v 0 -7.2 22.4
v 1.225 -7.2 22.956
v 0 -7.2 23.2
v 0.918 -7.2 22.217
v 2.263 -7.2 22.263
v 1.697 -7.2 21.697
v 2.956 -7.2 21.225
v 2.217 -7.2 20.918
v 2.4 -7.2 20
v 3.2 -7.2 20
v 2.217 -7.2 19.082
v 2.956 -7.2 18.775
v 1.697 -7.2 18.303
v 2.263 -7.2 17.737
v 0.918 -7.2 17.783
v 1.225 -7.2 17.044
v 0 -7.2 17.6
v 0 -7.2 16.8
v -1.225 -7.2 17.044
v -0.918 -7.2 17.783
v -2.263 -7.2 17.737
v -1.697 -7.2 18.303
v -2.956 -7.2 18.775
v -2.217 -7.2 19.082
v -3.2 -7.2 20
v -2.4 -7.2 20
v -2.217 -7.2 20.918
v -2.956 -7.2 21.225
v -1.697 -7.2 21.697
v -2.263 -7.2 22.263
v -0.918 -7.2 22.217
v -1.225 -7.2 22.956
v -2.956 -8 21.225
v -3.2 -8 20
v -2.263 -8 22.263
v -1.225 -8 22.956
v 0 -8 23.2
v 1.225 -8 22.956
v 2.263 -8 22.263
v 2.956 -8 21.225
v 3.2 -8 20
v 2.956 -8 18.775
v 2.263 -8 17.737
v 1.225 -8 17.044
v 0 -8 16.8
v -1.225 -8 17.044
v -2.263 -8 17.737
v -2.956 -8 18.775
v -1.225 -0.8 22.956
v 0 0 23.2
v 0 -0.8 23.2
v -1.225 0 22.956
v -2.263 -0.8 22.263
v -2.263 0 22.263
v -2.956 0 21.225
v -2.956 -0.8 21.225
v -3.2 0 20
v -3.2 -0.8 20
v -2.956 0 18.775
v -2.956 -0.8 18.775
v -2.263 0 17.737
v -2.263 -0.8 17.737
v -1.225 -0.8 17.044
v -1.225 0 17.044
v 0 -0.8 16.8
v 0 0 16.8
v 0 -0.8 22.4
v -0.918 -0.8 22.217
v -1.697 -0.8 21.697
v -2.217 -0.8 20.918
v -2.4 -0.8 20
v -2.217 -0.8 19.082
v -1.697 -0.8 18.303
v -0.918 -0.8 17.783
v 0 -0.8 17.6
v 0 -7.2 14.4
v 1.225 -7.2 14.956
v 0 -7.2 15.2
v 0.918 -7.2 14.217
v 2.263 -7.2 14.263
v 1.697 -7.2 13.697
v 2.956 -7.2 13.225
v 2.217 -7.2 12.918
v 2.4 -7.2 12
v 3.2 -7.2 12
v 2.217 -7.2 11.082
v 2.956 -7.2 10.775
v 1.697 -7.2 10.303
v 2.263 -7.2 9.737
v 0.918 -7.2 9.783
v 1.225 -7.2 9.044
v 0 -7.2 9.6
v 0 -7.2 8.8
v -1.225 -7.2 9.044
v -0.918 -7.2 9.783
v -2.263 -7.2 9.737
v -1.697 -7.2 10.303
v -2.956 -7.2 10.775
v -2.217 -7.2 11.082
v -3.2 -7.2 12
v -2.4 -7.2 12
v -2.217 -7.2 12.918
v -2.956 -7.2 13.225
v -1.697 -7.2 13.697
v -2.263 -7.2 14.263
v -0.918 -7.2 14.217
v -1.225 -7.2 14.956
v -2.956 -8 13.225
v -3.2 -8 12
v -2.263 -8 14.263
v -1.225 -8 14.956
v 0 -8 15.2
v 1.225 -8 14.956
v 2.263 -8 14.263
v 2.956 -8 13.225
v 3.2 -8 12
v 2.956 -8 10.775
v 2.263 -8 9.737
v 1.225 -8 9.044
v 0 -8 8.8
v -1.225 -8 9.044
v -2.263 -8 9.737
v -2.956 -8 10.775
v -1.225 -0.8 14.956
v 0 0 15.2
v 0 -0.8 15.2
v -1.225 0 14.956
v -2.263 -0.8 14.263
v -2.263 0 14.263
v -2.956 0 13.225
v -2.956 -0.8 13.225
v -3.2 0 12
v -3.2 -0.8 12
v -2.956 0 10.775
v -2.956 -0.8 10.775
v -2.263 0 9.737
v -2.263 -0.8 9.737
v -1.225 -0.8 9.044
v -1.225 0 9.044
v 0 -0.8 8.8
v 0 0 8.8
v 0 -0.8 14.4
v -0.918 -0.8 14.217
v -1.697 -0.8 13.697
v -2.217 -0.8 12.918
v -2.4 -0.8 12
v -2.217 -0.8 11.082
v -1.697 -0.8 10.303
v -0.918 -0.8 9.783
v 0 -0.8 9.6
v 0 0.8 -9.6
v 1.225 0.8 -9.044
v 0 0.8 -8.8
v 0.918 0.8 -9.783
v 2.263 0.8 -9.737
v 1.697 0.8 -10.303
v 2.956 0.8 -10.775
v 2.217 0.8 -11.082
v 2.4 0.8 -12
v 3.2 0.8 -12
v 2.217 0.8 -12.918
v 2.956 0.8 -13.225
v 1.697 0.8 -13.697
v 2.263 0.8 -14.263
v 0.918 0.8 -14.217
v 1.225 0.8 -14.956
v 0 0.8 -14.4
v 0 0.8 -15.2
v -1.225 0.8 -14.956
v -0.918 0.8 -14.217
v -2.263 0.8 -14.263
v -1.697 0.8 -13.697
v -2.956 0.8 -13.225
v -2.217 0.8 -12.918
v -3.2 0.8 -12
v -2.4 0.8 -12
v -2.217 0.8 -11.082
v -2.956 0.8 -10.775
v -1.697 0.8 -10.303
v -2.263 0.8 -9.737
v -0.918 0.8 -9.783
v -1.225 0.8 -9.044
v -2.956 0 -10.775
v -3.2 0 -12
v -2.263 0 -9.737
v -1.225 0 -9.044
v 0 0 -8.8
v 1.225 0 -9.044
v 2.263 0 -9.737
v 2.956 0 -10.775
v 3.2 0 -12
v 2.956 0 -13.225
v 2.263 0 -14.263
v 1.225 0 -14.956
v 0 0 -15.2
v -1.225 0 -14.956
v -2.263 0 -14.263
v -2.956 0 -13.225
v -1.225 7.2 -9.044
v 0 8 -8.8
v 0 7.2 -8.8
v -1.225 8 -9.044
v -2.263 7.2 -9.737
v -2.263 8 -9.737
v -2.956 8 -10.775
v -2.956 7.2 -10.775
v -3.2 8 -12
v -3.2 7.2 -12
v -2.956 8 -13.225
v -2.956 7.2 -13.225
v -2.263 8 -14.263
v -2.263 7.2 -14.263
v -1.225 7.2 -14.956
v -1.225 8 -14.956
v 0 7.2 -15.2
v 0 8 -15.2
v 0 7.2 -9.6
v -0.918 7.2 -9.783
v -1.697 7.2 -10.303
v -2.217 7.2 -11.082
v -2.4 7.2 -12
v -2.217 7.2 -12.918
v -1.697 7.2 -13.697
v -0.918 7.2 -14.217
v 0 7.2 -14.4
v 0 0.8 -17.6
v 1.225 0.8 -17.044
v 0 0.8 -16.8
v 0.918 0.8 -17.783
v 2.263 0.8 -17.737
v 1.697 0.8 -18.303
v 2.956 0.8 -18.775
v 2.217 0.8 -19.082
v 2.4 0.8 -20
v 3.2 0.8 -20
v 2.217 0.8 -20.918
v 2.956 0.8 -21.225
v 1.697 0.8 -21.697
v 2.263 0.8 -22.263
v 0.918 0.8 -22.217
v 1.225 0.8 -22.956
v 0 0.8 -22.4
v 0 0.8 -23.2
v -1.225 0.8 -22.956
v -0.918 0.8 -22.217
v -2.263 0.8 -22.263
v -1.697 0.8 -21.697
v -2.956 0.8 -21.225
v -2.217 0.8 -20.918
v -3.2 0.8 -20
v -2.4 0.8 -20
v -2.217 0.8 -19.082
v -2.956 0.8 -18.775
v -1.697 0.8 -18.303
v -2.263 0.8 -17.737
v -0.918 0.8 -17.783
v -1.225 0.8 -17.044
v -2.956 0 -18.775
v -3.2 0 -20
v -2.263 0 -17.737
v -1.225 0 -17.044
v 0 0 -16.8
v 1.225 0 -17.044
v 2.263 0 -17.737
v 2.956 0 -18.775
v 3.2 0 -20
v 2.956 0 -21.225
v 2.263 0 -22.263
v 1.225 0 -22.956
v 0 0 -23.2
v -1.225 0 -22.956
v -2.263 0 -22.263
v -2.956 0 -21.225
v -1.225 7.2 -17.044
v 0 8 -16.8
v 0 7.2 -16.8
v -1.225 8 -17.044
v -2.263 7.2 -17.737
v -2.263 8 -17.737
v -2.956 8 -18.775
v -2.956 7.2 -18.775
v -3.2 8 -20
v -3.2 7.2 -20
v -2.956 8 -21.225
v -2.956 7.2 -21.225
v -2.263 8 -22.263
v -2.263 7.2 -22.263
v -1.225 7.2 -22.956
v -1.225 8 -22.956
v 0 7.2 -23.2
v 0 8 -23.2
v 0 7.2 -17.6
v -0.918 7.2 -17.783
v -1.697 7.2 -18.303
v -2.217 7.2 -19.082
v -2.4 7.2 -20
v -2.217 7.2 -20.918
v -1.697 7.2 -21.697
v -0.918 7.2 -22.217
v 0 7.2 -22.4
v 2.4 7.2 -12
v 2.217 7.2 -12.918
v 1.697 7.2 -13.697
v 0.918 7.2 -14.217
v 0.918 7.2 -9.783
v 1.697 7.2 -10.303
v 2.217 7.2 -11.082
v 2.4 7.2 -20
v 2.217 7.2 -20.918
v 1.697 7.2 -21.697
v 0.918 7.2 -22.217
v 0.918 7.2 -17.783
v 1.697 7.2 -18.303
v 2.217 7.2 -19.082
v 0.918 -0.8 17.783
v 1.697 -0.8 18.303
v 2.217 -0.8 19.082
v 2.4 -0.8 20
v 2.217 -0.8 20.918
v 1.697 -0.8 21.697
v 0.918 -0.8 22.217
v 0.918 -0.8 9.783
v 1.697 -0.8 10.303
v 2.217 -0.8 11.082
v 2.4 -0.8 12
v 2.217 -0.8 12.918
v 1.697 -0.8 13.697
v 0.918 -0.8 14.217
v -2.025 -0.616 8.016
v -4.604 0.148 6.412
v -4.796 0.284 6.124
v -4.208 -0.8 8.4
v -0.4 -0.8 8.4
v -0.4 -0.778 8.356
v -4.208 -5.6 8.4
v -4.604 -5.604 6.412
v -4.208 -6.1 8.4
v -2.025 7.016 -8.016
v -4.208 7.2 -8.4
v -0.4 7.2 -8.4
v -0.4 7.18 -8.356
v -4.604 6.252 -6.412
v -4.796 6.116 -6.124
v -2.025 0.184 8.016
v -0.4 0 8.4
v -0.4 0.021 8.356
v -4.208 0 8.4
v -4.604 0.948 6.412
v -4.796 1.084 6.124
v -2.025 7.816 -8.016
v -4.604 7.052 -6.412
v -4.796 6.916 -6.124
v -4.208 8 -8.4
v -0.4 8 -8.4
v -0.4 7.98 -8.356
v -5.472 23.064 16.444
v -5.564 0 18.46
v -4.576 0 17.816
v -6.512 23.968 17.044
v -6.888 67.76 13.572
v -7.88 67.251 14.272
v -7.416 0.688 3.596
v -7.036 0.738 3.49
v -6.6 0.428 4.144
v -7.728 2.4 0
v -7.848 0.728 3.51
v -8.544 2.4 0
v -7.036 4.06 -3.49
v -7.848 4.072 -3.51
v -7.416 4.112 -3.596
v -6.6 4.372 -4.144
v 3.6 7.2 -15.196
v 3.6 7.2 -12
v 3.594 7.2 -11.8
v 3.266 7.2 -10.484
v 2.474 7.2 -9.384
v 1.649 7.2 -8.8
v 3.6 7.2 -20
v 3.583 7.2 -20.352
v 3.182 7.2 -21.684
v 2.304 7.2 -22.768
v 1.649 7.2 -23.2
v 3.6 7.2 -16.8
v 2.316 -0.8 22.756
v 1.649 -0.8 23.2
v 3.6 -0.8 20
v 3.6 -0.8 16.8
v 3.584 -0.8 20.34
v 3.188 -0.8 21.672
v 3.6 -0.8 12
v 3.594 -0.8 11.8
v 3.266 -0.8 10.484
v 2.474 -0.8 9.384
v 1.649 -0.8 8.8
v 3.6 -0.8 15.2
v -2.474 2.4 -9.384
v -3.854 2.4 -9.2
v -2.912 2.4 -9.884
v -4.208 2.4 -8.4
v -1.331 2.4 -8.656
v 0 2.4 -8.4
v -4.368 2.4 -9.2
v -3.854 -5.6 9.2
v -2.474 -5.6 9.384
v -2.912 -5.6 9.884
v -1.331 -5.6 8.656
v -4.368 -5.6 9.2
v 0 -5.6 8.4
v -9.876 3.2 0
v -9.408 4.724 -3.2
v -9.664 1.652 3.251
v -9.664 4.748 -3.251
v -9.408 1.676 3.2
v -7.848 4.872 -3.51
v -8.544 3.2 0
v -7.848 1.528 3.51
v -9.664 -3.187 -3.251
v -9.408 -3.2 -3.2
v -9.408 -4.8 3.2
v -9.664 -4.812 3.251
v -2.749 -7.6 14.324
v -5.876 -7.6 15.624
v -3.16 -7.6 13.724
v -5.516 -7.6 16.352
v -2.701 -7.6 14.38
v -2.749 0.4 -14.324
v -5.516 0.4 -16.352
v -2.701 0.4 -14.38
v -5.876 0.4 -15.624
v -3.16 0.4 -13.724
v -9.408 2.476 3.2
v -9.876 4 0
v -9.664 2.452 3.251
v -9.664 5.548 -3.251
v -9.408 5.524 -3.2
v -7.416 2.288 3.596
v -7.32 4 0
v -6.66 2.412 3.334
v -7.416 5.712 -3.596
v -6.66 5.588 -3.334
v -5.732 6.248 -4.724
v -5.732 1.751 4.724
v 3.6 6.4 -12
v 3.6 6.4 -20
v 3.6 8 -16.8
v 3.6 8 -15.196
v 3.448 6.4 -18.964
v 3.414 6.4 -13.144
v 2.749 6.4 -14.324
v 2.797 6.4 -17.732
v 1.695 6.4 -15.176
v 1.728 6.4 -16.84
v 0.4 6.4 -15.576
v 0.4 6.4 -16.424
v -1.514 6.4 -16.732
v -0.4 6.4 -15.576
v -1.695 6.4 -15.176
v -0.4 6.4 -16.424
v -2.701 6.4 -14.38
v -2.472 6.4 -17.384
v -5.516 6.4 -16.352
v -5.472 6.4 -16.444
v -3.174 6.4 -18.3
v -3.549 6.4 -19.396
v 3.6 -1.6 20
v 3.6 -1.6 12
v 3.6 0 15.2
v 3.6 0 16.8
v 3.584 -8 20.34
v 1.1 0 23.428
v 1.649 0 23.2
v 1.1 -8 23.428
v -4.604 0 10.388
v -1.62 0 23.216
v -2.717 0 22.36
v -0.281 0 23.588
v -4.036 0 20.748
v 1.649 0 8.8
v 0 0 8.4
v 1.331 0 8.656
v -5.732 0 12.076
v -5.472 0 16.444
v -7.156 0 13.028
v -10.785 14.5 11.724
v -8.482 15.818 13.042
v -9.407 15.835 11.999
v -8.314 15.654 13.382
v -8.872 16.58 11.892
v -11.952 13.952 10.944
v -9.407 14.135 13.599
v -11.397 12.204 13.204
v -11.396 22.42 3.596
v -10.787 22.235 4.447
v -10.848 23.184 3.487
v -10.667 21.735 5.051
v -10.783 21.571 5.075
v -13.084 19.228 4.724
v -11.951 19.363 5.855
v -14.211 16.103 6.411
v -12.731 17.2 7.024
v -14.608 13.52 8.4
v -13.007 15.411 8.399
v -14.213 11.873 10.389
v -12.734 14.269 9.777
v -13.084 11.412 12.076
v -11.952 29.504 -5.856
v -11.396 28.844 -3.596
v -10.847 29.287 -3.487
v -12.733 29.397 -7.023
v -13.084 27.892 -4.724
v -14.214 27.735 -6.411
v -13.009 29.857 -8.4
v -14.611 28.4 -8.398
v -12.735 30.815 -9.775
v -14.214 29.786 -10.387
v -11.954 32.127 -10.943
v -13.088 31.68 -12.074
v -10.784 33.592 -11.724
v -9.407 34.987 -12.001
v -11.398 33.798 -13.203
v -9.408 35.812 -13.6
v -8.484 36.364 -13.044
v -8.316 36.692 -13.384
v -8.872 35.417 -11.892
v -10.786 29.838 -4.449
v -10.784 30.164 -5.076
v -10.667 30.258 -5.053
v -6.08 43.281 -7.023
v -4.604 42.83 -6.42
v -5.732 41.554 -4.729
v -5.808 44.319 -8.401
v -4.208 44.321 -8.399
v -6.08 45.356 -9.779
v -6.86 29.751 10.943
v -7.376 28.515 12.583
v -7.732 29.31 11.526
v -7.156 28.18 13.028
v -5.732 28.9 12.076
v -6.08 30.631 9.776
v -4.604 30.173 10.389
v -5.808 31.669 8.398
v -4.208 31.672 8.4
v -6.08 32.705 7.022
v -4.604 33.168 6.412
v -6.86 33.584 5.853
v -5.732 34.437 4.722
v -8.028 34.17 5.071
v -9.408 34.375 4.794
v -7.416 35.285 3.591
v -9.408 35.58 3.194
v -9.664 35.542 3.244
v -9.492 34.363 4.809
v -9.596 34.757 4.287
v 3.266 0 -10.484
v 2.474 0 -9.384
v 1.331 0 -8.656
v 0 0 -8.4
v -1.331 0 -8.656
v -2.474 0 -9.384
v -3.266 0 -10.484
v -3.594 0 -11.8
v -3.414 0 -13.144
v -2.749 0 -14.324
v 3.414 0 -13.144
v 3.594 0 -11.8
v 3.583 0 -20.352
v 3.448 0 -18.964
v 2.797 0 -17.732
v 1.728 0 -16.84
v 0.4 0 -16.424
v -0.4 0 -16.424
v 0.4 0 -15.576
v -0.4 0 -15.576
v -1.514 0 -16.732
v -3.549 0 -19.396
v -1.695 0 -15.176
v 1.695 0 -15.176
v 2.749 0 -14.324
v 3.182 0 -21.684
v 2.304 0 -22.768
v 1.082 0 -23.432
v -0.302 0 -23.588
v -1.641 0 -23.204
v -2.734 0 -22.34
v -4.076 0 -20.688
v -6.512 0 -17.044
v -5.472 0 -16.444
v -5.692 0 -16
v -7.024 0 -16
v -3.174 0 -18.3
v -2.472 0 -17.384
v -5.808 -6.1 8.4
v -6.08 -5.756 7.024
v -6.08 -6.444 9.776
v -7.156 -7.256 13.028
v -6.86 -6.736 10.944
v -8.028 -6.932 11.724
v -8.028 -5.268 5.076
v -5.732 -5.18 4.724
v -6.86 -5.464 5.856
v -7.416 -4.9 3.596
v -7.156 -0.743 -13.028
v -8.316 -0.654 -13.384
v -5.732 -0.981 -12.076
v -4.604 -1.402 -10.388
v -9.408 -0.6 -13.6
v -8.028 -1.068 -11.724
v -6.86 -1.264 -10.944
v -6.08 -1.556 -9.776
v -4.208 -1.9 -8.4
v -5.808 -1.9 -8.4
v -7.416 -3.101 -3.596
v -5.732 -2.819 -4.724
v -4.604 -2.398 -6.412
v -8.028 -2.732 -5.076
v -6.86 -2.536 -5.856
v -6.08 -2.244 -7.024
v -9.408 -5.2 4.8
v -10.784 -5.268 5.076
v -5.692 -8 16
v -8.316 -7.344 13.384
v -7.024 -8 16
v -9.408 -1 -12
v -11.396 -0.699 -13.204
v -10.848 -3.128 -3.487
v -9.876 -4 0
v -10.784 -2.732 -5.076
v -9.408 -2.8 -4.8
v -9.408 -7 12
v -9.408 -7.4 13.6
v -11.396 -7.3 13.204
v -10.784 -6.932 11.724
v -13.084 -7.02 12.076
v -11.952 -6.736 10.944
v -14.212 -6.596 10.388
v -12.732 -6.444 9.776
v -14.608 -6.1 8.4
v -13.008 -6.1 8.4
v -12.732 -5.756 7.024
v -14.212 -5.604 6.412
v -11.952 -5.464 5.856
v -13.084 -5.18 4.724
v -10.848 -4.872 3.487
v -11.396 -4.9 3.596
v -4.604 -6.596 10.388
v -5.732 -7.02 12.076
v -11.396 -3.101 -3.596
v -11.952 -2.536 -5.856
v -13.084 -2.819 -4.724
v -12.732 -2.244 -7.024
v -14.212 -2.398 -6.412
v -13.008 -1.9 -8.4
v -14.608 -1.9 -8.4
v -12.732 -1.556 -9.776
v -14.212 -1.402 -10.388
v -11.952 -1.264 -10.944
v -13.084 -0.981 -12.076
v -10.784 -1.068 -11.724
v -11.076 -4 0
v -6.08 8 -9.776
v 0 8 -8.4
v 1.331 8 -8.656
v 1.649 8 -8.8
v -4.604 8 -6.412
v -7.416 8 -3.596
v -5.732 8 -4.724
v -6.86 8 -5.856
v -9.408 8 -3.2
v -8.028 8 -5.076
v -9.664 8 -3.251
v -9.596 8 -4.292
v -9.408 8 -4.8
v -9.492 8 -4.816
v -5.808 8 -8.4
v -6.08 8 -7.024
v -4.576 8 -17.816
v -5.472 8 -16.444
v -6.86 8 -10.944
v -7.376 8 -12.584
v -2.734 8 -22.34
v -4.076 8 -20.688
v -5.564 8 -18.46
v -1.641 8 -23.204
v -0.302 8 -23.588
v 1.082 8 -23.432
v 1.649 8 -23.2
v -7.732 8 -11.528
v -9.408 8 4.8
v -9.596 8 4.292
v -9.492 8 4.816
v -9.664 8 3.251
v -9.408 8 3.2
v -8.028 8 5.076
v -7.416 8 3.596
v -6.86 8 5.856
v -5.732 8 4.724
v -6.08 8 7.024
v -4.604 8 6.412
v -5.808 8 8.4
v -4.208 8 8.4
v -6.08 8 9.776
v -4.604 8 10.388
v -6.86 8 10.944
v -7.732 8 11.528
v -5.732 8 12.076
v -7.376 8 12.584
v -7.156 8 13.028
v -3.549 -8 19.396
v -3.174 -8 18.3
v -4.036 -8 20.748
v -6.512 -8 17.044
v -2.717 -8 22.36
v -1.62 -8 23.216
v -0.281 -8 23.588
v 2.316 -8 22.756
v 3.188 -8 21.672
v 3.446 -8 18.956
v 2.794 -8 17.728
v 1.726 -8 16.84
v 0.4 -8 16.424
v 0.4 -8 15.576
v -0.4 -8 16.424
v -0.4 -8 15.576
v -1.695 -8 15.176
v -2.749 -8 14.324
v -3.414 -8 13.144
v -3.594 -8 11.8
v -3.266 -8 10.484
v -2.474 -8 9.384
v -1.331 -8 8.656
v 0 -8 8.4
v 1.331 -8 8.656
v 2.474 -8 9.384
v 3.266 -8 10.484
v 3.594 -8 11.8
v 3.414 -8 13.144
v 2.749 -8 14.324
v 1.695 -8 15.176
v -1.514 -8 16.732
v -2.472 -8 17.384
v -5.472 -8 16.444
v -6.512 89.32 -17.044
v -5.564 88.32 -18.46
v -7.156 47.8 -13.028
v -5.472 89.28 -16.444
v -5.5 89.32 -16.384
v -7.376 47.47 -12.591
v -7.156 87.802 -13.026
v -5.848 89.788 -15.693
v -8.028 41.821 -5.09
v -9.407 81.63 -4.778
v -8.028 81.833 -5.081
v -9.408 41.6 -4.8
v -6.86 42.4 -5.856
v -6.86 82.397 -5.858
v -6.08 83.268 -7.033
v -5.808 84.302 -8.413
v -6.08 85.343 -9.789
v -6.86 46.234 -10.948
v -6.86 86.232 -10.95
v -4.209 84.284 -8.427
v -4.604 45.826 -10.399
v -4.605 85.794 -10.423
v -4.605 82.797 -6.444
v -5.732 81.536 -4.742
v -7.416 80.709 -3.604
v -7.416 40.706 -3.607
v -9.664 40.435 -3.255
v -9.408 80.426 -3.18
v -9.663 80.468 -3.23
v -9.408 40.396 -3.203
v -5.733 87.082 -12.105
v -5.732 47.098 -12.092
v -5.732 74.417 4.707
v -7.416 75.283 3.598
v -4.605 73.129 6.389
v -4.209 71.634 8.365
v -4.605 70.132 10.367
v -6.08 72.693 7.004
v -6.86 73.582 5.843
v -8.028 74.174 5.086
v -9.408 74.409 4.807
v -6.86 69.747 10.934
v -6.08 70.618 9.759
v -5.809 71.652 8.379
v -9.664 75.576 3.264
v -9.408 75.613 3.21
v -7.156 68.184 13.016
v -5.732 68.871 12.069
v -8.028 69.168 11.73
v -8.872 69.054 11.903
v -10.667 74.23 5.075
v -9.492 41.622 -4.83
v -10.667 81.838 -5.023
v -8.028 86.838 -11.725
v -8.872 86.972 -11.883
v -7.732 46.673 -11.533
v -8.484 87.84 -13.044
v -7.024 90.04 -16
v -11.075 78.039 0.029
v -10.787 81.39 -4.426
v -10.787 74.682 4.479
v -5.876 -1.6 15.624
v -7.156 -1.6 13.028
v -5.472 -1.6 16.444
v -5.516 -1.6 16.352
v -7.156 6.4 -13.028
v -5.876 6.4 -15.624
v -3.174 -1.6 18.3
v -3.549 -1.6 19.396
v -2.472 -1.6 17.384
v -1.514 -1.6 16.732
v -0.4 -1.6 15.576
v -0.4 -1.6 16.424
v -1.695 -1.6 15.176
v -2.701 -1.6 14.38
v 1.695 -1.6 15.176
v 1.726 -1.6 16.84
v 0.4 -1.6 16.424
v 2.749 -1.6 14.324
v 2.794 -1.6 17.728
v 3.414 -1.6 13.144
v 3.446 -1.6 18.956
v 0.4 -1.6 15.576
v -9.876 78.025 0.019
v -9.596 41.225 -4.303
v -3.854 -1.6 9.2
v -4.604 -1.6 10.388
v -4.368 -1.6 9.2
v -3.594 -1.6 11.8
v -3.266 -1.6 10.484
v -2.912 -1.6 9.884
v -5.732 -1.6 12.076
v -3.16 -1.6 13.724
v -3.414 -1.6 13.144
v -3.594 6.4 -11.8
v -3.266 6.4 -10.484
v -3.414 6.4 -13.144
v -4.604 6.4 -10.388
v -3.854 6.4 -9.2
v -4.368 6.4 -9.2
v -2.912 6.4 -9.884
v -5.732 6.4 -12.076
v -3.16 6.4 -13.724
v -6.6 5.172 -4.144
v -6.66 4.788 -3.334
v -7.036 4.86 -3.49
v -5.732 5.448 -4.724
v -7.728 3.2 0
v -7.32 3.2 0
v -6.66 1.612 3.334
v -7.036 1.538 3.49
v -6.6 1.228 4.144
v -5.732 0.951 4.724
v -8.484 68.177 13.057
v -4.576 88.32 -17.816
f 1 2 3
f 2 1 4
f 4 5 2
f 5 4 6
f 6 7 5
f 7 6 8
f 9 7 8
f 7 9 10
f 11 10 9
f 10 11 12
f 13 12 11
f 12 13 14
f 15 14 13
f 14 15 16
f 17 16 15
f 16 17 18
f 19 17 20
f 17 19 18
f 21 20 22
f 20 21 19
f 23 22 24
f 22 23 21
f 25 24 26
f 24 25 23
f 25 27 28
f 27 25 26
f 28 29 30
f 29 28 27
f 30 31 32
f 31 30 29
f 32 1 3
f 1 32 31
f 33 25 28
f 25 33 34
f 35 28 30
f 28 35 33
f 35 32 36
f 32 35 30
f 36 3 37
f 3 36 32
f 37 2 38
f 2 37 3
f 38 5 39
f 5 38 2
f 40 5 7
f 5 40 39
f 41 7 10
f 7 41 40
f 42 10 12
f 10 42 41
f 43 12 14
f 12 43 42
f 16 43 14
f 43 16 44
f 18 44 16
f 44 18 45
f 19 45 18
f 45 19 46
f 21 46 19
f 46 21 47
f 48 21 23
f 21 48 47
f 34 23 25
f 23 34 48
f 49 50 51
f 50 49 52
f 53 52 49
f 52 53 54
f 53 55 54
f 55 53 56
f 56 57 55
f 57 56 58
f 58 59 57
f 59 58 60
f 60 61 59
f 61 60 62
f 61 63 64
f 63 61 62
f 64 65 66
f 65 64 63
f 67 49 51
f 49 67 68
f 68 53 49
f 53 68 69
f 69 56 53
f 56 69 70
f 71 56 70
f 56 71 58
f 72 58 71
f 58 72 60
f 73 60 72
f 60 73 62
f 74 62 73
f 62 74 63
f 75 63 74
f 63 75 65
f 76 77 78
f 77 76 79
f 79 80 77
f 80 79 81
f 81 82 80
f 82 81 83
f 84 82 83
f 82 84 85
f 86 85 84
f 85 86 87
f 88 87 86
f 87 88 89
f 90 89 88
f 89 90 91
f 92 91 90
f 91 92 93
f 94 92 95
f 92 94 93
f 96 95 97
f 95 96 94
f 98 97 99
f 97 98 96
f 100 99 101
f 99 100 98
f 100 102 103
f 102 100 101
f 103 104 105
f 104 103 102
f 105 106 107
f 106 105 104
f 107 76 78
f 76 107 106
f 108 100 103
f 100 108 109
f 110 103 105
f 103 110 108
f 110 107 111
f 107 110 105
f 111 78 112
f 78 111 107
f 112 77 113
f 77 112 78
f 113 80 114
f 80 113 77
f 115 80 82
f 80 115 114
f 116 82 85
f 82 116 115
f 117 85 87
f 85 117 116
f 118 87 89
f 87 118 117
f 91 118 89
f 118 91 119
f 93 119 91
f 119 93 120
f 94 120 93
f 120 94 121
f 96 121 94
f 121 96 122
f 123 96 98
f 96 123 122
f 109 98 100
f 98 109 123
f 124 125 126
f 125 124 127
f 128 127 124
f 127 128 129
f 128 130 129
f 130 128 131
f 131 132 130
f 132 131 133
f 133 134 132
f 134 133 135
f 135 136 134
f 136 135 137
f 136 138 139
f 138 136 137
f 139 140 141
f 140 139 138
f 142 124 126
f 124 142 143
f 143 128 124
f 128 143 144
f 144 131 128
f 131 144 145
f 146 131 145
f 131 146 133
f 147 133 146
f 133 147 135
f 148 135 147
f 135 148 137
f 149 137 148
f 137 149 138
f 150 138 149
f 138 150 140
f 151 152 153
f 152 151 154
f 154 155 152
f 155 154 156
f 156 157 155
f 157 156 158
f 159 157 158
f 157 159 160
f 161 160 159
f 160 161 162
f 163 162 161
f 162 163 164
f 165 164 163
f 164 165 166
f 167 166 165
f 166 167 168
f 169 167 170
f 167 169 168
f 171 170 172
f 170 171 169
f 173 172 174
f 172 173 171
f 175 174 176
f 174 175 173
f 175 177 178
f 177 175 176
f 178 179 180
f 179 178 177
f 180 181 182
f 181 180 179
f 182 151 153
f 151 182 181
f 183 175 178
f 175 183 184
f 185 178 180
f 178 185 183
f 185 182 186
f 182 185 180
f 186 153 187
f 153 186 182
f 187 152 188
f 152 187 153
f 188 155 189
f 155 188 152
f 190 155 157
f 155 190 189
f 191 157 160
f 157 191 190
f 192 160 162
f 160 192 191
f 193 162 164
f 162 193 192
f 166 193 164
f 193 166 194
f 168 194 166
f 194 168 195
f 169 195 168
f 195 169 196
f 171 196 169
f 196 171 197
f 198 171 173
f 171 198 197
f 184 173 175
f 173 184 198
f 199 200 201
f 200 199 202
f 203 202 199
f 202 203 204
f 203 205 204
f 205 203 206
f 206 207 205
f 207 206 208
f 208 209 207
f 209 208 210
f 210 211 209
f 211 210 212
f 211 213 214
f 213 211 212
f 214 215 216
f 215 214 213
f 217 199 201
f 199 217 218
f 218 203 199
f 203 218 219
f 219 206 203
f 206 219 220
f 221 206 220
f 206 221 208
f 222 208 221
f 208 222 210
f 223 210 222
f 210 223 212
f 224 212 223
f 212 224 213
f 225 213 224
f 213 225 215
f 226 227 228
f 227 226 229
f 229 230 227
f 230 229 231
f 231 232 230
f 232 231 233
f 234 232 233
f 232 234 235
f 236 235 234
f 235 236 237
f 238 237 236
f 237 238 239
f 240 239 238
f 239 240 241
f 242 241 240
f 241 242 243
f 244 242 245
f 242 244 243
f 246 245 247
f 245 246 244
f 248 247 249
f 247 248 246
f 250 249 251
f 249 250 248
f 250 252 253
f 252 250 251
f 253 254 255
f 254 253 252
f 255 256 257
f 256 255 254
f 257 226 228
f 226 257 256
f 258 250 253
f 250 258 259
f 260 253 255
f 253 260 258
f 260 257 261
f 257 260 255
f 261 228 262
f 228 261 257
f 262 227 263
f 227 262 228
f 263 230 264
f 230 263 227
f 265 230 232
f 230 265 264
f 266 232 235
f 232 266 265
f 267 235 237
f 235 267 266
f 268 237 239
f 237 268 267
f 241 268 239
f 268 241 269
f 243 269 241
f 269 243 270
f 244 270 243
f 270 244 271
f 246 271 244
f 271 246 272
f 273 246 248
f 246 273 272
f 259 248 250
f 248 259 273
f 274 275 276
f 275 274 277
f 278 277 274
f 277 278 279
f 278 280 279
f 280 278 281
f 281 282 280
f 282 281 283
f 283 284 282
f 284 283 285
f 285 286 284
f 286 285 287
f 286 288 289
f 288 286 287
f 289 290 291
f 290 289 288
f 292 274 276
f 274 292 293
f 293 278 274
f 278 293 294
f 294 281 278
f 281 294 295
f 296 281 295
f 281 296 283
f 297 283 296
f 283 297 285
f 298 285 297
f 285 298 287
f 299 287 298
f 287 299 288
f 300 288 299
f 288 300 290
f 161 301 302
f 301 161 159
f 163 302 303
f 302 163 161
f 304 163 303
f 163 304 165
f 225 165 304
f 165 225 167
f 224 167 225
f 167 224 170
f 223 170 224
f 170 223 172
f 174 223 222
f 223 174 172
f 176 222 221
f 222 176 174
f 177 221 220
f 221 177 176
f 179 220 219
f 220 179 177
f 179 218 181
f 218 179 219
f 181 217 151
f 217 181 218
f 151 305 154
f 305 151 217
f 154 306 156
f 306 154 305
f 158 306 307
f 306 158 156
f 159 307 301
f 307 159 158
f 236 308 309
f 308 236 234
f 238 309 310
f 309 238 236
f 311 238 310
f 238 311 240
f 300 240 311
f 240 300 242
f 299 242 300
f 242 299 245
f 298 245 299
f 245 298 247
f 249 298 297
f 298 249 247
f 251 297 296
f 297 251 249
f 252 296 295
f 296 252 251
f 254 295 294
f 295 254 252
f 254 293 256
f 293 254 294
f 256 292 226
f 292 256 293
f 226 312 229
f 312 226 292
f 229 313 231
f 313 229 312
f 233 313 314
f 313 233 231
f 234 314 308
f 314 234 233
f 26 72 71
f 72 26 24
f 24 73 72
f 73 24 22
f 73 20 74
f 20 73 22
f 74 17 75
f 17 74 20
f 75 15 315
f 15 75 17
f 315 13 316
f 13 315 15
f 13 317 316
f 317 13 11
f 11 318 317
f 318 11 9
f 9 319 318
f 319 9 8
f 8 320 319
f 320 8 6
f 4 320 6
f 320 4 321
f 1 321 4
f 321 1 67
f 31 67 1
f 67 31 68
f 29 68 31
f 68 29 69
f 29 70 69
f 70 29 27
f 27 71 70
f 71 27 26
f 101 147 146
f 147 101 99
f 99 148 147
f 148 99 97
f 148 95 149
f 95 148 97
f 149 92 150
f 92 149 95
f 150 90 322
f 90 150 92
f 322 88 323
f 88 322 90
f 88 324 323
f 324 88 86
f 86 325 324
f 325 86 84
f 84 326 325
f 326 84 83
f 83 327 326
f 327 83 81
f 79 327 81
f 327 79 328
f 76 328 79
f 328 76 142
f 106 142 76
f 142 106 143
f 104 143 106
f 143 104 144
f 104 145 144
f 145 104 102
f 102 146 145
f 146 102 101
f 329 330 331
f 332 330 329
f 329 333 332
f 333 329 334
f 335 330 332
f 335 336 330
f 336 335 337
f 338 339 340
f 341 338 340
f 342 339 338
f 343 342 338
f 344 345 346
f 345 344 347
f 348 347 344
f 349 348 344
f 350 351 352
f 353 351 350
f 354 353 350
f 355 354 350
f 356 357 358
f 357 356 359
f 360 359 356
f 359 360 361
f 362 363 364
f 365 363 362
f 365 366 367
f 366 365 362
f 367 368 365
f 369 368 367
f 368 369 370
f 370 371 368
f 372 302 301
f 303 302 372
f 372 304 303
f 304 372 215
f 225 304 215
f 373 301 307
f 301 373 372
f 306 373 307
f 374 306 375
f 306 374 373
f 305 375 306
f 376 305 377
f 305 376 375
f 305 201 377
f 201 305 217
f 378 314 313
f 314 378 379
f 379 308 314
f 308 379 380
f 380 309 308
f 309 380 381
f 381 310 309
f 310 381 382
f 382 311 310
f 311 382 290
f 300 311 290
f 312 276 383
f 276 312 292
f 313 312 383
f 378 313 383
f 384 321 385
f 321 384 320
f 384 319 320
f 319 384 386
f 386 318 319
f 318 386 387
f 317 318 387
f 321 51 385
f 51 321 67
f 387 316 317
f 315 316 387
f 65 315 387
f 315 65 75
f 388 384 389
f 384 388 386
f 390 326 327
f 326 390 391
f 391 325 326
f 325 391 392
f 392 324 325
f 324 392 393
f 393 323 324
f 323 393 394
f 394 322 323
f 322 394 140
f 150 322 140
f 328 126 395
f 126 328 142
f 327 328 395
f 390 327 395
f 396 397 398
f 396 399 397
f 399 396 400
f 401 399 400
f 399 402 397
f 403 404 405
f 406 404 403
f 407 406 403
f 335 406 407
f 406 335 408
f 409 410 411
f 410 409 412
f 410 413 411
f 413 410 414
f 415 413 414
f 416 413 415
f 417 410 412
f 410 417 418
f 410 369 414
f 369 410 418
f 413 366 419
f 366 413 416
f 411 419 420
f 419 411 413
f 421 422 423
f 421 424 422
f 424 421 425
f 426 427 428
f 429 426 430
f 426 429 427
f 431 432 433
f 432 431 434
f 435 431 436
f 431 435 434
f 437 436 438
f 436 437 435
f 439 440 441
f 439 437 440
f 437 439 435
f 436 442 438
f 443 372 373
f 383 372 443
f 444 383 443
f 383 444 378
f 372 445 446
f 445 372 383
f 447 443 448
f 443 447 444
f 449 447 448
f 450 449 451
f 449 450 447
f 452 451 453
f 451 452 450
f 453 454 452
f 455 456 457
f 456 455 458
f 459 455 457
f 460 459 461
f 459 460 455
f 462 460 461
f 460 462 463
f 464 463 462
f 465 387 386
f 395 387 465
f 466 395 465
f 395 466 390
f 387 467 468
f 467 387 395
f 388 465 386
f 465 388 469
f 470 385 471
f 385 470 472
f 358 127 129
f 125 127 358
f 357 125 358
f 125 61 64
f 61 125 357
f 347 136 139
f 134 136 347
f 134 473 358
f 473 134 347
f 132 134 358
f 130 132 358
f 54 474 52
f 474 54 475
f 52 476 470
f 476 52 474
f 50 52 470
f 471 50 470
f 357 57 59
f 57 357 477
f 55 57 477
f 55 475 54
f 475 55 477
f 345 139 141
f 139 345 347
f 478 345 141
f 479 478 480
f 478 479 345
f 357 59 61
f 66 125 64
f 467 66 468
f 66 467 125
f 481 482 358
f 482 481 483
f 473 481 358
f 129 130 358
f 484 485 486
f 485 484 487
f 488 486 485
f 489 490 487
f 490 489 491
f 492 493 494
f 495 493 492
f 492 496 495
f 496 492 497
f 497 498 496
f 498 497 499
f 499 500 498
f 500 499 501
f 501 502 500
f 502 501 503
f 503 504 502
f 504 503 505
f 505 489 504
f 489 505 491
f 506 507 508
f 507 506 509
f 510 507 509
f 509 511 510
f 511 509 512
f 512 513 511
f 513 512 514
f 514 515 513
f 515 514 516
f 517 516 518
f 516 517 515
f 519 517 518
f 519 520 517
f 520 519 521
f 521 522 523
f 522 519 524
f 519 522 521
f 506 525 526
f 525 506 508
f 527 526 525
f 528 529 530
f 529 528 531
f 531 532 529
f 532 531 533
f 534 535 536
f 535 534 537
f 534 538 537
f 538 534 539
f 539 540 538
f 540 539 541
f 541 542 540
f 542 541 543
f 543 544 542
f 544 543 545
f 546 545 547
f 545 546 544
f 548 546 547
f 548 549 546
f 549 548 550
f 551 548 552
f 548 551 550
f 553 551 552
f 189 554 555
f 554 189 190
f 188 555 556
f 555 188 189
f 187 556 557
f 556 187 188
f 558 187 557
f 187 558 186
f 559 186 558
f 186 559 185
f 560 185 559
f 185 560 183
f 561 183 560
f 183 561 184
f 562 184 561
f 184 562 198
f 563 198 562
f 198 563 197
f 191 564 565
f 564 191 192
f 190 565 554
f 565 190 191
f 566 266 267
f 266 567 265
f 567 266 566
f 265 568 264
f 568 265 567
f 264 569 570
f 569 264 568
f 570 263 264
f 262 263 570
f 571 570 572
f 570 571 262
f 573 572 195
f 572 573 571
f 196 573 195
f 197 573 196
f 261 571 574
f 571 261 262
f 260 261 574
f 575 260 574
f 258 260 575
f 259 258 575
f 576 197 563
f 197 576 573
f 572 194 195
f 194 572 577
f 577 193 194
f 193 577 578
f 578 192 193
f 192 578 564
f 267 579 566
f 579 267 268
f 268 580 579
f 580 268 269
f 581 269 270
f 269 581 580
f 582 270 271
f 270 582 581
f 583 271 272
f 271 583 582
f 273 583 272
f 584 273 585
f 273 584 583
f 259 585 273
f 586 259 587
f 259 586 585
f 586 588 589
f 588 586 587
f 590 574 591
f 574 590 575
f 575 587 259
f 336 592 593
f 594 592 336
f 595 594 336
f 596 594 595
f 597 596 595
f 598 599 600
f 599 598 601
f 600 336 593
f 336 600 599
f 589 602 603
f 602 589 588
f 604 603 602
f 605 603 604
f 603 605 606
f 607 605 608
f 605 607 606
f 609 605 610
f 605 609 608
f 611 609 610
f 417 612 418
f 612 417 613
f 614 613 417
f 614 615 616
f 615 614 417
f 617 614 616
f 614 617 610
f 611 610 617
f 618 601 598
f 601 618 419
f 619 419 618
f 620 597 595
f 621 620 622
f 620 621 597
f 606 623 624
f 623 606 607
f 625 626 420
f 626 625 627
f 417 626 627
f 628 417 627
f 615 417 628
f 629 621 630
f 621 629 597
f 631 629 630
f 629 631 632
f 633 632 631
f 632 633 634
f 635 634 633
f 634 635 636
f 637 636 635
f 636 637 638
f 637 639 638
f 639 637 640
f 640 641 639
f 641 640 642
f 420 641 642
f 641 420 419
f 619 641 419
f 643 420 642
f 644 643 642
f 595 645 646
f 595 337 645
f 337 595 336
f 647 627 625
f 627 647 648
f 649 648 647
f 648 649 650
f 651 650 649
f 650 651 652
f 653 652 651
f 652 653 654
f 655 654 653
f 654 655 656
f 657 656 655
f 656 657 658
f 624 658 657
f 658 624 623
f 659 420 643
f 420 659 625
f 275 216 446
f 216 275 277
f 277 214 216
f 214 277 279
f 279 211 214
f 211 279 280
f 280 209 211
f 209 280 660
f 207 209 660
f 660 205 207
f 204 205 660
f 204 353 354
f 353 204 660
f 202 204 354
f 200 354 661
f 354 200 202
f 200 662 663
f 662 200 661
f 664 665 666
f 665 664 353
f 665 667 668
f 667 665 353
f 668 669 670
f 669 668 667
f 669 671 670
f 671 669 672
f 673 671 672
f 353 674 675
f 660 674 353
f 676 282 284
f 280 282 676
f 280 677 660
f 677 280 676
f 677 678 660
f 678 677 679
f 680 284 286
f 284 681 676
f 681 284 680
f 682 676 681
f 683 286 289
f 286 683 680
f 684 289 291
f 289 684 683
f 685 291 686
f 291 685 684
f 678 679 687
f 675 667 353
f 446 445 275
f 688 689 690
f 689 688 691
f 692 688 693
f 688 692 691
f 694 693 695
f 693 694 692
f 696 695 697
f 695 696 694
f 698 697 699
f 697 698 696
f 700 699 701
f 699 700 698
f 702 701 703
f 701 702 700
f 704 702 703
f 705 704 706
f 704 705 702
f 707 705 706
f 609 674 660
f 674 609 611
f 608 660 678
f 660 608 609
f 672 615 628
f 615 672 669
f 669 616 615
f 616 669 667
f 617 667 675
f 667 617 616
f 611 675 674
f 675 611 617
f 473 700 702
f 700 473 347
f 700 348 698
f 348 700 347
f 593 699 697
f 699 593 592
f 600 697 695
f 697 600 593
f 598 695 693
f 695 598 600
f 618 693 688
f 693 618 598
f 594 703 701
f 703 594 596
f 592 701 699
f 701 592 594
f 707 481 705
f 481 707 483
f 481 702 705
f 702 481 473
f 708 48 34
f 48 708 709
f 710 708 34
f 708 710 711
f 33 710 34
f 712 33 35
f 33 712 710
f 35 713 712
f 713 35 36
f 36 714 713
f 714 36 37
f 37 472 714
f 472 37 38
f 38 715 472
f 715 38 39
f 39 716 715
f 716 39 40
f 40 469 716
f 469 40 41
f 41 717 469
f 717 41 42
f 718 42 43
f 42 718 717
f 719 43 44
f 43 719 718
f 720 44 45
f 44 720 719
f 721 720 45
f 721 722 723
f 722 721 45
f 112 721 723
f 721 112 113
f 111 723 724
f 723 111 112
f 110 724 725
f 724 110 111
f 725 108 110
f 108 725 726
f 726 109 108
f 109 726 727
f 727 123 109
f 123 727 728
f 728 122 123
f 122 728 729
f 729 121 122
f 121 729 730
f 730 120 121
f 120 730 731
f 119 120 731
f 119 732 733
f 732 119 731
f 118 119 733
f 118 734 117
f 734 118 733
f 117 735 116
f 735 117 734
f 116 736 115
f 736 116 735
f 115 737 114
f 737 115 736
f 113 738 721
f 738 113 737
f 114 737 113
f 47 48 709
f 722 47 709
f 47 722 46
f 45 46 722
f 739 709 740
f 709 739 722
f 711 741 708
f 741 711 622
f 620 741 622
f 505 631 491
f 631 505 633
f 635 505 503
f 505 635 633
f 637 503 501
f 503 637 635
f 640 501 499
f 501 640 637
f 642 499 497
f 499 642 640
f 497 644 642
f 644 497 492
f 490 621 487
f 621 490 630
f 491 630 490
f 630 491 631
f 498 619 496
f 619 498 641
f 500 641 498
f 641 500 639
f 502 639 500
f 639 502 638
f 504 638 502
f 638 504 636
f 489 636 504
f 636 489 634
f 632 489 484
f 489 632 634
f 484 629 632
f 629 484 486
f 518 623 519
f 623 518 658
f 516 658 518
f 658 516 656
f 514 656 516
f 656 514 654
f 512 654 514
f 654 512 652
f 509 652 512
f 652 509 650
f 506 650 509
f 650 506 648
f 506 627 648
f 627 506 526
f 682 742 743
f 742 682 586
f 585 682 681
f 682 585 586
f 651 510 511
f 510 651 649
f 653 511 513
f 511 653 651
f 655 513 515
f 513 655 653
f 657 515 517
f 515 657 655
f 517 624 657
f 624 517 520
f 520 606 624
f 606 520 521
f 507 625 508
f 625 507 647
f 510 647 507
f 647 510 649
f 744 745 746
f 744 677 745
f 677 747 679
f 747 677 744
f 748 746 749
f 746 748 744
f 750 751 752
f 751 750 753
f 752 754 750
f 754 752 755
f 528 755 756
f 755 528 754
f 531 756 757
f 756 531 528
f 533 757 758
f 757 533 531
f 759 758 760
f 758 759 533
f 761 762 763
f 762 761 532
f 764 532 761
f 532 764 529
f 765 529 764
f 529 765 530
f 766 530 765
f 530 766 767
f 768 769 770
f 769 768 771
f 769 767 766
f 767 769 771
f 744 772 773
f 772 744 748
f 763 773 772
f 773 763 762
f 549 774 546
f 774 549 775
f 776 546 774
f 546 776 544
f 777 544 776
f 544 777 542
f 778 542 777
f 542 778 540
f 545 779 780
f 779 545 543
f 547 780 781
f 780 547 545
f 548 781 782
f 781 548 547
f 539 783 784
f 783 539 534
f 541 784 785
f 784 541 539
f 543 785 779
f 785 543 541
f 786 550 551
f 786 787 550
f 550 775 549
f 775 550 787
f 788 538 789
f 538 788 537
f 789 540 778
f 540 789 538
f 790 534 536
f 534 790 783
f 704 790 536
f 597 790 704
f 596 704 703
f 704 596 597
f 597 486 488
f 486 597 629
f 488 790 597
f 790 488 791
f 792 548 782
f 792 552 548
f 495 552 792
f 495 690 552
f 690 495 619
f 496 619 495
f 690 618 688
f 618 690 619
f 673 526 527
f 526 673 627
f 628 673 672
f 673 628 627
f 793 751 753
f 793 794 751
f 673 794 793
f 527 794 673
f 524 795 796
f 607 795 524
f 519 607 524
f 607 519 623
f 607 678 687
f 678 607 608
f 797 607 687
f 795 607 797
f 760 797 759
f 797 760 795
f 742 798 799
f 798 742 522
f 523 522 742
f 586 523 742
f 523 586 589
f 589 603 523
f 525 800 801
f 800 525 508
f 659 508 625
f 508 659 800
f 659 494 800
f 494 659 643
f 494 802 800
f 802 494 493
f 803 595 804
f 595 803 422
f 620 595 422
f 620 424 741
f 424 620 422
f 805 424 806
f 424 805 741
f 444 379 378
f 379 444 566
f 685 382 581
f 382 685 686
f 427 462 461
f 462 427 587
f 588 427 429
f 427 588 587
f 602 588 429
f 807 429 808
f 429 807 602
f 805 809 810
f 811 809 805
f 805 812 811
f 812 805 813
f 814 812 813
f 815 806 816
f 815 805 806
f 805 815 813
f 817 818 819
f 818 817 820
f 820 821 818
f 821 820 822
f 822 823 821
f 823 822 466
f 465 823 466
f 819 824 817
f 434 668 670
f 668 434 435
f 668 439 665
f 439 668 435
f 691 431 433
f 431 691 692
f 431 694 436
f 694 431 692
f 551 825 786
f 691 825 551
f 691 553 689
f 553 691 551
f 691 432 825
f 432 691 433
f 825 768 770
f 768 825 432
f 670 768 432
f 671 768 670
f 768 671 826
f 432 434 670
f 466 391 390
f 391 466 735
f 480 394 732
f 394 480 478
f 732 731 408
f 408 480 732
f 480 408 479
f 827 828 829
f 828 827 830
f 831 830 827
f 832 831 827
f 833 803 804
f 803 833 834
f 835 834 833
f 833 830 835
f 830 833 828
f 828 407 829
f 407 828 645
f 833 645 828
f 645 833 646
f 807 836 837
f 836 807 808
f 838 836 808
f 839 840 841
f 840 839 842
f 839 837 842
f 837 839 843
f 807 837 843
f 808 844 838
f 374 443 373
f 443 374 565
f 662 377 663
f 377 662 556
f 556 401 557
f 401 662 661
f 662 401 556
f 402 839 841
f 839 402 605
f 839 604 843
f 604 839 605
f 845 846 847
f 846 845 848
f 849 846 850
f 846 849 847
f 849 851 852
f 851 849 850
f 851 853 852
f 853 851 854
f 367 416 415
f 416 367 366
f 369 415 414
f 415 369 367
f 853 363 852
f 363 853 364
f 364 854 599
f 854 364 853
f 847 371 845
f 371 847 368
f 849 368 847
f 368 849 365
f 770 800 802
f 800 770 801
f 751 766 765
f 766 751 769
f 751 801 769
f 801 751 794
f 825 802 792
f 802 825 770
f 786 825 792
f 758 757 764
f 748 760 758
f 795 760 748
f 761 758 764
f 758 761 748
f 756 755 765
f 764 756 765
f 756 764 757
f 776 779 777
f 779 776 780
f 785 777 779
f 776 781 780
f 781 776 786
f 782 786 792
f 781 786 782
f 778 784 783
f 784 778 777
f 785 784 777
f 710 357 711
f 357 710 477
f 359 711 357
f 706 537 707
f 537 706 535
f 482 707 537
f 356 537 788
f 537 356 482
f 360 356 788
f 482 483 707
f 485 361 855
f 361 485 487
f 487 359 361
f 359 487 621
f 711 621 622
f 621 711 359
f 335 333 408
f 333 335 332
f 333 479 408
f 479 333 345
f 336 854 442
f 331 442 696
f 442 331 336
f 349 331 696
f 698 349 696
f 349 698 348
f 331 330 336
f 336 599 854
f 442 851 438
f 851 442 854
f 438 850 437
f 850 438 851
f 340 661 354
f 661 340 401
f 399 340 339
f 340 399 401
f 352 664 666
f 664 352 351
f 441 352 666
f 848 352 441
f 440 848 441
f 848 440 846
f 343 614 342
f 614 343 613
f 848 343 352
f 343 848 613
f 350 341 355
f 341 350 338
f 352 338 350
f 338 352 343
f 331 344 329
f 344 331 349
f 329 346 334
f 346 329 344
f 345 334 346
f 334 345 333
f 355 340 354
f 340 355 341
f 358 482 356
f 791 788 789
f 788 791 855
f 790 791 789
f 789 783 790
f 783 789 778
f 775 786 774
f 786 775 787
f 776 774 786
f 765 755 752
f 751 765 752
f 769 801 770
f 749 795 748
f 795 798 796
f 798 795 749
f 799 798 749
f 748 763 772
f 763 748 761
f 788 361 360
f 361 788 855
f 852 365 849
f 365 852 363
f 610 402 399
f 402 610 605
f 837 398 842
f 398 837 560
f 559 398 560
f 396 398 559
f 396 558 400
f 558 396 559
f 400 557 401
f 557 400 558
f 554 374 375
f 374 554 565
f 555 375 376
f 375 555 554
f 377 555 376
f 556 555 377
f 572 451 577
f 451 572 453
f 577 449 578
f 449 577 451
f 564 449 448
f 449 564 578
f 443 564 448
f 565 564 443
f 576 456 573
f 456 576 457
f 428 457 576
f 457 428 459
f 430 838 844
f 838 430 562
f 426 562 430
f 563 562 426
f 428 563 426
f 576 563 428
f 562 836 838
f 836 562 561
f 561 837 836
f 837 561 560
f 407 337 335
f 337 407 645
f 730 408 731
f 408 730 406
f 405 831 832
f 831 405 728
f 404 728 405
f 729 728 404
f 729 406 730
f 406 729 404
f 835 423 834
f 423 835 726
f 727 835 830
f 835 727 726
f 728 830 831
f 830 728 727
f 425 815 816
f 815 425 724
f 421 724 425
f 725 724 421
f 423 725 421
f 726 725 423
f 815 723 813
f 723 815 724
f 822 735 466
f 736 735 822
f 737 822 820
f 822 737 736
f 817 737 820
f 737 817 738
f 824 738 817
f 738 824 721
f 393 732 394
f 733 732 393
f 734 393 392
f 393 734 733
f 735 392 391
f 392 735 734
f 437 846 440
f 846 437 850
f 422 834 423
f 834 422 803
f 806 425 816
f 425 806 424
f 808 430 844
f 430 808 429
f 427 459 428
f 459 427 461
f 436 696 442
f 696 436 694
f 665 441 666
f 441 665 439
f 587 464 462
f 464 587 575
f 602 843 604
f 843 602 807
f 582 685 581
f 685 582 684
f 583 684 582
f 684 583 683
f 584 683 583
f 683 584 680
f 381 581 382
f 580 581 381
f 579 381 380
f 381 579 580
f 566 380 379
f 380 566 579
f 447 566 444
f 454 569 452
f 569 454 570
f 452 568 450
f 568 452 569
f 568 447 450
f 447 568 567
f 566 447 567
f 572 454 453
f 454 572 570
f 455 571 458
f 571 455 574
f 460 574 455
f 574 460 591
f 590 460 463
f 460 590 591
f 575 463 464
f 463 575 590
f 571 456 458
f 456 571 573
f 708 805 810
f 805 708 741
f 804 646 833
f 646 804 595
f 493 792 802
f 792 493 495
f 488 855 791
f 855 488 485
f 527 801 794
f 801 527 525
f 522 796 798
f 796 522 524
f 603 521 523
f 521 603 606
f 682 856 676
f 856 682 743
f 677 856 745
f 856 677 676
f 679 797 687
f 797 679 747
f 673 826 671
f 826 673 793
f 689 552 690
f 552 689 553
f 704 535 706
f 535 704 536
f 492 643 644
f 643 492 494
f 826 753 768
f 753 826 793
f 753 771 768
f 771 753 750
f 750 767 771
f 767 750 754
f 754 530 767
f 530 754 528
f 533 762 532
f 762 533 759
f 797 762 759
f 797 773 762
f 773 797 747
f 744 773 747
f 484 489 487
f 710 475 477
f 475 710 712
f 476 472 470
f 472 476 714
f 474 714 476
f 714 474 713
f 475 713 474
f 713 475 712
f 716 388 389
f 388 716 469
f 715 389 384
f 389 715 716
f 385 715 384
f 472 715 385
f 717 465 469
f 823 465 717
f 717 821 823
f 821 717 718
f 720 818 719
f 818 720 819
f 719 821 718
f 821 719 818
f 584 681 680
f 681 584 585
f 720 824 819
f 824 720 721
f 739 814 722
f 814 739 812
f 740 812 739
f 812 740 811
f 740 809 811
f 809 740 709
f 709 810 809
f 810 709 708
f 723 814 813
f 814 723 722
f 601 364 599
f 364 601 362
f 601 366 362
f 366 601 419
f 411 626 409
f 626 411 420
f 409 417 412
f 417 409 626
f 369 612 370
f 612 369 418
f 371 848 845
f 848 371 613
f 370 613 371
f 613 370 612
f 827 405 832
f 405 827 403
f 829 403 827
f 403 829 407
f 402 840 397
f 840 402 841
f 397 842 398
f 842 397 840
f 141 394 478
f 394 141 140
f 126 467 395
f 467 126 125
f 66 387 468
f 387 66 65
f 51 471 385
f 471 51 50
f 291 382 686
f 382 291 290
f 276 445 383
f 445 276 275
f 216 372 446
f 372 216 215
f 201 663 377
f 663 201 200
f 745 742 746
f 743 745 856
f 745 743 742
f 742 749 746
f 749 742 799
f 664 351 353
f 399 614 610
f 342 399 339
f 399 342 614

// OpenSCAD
use <../lib.scad>
use <32189.scad>
function ldraw_lib__32188() = [
// 0 Technic Panel Fairing #3
// 0 Name: 32188.dat
// 0 Author: Marc Klein [marckl]
// 0 !LDRAW_ORG Part UPDATE 2015-01
// 0 !LICENSE Licensed under CC BY 2.0 and CC BY 4.0 : see CAreadme.txt
// 
// 0 BFC CERTIFY CCW
  [0,"BFC","CERTIFY"],
  [0,"BFC","CCW"],
// 
// 0 !HISTORY 2000-09-30 [PTadmin] Official Update 2000-02
// 0 !HISTORY 2007-06-25 [PTadmin] Header formatted for Contributor Agreement
// 0 !HISTORY 2008-07-01 [PTadmin] Official Update 2008-01
// 0 !HISTORY 2015-01-04 [MagFors] BFCed
// 0 !HISTORY 2015-10-11 [PTadmin] Official Update 2015-01
// 
// 
// 1 16 0 0 0 -1 0 0 0 1 0 0 0 1 32189.dat
  [1,16,0,0,0,-1,0,0,0,1,0,0,0,1, ldraw_lib__32189()],
];
makepoly(ldraw_lib__32188(), line=0.2);
